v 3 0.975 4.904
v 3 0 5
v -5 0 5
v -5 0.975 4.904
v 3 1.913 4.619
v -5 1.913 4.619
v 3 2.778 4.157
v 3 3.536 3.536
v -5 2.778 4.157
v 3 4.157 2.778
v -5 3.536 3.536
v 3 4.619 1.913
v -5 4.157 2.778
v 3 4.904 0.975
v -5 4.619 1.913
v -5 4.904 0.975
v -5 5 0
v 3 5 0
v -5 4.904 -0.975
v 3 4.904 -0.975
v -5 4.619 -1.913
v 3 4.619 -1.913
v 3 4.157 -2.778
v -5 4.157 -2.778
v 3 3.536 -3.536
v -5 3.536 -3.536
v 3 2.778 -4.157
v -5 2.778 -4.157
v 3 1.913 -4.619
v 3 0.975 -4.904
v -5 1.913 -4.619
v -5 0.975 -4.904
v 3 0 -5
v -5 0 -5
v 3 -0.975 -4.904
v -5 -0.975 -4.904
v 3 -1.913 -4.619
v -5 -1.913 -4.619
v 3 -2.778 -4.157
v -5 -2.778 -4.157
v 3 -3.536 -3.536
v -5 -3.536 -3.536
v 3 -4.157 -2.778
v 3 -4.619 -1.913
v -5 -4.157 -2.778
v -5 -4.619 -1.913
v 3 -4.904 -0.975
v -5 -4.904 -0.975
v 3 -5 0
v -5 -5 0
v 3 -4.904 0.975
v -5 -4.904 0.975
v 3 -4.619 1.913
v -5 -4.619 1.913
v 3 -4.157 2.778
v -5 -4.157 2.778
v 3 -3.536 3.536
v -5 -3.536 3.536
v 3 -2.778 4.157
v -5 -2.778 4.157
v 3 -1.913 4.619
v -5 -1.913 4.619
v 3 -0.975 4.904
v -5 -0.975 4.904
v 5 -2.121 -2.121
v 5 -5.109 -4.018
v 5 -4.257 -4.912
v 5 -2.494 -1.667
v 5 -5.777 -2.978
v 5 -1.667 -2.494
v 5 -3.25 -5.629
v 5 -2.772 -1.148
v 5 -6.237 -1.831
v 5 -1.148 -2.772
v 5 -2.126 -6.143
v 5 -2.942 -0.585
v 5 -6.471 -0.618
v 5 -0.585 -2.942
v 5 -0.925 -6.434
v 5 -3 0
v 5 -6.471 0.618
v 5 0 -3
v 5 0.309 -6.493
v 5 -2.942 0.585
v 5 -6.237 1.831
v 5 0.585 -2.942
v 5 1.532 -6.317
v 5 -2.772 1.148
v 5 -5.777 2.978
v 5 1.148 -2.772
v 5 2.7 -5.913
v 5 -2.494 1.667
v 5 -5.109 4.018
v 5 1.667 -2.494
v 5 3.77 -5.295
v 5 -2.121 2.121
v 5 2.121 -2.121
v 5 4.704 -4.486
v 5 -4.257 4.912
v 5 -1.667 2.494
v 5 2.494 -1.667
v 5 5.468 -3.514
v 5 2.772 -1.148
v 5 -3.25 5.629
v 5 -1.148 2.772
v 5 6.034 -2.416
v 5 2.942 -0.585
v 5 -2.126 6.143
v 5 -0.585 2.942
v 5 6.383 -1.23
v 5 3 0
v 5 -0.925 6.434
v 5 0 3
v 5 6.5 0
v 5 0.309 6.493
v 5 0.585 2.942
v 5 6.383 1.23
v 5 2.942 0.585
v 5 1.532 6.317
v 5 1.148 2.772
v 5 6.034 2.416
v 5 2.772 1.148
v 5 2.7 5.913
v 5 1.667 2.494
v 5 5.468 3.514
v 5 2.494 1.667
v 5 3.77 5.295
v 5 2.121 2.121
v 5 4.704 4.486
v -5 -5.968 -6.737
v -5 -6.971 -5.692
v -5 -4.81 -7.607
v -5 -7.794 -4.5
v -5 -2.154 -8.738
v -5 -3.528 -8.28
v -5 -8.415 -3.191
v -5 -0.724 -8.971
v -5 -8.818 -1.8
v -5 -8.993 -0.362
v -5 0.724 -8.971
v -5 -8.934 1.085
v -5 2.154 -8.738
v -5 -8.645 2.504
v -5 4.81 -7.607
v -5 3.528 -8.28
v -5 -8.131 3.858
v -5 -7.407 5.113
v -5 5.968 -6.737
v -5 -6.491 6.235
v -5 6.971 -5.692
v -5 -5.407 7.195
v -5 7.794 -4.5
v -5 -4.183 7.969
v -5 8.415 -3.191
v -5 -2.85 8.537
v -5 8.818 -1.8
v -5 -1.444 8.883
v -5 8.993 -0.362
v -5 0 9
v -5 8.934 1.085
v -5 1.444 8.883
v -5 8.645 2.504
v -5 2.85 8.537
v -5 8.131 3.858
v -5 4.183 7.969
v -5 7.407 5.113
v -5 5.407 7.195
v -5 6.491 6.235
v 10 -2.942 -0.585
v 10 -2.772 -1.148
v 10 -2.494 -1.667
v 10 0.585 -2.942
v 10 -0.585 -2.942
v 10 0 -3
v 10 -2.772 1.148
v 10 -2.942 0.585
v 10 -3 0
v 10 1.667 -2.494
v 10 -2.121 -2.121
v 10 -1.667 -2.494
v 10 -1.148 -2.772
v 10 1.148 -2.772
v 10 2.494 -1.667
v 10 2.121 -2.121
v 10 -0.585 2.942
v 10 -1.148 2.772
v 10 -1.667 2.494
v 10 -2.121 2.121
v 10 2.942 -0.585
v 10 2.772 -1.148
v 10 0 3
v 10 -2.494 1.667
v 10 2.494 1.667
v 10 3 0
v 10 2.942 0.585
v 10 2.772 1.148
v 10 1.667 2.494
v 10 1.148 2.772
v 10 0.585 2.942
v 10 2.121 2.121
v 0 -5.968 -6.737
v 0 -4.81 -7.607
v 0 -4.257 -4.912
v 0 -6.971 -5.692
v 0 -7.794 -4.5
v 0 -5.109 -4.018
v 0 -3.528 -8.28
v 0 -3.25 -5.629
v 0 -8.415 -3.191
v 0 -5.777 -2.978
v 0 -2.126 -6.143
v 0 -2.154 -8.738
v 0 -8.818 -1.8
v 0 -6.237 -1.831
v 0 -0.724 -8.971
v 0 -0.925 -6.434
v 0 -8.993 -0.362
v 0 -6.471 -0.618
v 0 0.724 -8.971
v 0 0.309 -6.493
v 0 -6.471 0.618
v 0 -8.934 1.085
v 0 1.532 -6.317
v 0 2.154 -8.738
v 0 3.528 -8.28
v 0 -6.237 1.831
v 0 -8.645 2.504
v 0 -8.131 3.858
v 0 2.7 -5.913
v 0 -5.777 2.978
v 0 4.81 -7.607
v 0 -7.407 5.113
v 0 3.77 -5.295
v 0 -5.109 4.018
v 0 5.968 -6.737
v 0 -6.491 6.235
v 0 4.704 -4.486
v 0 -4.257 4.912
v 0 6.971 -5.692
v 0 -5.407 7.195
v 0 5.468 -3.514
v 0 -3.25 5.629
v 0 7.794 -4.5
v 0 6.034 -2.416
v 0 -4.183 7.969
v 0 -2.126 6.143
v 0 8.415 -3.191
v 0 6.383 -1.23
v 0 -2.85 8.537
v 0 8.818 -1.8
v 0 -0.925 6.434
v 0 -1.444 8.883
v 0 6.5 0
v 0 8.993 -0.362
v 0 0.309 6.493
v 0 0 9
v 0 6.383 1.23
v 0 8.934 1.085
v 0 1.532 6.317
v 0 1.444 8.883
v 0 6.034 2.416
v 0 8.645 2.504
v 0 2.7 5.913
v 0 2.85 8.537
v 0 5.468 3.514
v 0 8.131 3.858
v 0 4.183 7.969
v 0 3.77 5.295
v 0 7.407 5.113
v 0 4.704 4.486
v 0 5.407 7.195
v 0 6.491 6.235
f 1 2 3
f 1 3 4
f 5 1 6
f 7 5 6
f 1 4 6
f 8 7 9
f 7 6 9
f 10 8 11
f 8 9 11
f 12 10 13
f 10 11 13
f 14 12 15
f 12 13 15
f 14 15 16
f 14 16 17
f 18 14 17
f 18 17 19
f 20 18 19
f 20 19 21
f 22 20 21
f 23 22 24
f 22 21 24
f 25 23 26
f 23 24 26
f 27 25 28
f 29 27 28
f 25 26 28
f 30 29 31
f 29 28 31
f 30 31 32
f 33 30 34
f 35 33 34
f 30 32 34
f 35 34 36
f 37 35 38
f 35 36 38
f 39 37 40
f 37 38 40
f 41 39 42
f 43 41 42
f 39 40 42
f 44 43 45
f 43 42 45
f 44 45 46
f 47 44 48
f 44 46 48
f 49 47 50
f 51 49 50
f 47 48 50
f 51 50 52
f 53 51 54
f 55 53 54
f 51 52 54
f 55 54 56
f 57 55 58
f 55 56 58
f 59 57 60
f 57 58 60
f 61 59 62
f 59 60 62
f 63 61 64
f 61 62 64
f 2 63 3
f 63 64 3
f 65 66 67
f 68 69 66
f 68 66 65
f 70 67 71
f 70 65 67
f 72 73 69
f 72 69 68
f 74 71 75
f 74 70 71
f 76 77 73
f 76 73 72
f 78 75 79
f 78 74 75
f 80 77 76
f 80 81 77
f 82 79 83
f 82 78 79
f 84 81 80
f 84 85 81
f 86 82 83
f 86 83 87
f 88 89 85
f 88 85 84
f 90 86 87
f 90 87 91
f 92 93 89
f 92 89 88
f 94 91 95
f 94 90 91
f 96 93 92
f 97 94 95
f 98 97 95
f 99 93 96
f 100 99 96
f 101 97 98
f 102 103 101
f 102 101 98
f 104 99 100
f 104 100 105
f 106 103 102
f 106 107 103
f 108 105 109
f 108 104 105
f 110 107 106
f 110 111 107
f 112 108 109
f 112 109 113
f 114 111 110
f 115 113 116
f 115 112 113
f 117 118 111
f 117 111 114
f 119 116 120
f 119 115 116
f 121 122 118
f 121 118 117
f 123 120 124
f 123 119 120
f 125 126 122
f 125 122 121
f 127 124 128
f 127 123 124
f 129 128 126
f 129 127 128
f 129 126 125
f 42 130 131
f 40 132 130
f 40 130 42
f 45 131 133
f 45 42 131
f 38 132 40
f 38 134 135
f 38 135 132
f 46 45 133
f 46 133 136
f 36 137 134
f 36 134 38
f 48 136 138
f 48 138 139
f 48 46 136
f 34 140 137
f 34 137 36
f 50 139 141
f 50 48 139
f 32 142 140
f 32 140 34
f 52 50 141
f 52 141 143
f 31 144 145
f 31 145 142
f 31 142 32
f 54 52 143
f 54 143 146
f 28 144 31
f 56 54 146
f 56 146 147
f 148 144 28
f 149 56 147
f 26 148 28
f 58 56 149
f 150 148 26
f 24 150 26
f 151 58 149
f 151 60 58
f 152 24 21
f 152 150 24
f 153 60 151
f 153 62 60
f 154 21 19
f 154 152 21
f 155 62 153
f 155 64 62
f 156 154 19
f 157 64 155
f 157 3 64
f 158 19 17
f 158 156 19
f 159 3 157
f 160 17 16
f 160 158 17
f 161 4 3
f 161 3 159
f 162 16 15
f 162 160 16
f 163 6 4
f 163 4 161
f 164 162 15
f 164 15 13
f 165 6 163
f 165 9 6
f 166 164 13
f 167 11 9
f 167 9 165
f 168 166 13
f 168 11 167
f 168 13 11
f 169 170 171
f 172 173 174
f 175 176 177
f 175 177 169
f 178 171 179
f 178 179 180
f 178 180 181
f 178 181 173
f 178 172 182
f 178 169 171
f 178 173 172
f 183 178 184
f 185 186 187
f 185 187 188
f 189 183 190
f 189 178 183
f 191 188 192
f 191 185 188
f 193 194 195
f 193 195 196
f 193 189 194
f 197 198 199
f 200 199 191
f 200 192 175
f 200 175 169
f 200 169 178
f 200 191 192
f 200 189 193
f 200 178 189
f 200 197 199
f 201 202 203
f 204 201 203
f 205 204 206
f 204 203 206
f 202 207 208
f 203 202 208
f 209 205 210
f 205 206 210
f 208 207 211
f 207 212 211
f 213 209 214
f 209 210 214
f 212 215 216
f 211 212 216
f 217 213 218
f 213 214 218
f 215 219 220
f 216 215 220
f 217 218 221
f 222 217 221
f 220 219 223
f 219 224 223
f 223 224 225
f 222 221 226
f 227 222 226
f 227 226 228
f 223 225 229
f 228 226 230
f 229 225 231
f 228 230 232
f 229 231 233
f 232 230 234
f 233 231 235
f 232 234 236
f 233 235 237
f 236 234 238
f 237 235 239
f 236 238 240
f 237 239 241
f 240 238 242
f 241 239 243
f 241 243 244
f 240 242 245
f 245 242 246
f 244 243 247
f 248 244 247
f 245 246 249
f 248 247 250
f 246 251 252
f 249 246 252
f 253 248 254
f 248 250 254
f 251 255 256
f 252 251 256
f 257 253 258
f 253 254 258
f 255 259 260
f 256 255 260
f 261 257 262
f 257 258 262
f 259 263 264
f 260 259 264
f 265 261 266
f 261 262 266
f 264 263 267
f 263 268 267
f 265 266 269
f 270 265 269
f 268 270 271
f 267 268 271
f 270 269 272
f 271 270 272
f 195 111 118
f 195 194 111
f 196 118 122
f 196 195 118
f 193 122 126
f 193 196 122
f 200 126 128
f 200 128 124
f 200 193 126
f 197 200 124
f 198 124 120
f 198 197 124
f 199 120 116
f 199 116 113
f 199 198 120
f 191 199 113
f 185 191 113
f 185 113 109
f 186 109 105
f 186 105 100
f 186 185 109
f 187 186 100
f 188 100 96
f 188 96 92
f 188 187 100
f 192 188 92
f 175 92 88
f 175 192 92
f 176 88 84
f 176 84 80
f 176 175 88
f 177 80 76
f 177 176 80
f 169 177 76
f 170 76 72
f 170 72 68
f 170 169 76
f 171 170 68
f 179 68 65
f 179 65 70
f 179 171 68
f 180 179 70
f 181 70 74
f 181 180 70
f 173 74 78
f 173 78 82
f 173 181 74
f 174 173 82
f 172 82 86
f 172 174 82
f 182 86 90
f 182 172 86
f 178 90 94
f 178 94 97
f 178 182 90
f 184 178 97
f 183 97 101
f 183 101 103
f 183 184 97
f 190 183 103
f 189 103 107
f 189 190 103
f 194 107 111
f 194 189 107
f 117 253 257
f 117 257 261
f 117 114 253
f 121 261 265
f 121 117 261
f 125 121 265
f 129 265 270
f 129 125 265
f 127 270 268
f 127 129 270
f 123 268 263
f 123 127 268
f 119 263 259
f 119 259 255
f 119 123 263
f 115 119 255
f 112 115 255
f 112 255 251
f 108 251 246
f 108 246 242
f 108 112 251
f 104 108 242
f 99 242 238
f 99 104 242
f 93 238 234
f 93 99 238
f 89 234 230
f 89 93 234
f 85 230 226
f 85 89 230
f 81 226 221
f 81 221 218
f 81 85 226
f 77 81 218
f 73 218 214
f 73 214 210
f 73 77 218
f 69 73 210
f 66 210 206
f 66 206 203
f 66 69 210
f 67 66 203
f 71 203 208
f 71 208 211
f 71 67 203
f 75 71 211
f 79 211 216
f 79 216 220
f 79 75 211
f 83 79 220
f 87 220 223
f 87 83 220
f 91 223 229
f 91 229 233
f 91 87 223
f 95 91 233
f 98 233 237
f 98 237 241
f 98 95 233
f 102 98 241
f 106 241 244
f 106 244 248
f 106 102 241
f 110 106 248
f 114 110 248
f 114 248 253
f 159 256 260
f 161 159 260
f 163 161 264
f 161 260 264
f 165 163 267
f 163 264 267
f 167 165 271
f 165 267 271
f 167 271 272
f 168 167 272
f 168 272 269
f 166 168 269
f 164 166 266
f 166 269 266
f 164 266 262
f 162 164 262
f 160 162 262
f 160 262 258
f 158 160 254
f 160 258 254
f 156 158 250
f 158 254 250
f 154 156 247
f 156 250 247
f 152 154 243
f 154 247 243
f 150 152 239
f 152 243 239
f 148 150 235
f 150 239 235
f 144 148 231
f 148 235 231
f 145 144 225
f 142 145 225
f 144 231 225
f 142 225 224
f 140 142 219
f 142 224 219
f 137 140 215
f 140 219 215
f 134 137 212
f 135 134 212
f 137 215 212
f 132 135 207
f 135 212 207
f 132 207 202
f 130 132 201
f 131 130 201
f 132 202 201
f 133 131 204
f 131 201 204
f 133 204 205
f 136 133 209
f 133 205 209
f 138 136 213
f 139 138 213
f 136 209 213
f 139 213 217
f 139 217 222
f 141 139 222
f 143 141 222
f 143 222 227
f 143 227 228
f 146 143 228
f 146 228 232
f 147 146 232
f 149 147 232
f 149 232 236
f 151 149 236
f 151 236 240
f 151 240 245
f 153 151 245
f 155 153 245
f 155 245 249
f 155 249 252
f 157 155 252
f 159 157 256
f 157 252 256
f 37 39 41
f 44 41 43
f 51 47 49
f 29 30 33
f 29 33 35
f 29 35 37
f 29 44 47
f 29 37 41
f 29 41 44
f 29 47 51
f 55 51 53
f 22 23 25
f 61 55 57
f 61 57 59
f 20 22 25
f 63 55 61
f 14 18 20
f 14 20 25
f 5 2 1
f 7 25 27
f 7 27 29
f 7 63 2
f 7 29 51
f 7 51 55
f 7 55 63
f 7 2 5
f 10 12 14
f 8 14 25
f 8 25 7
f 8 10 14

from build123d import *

# Parameters (mm, degrees)
SKETCH_3_R          = 9
EXTRUDE_1_DEPTH     = 5
SKETCH_4_R          = 5
CUT_EXTRUDE_1_DEPTH = 8


with BuildPart() as part:
    # 草图2 → 旋转1 (revolve)
    with BuildSketch(Plane.XY):
        Polygon((0, 0), (0, 6.5), (5, 6.5), (5, 3), (10, 3), (10, 0), align=None)
    revolve(axis=Axis((0, 0, 0), (1, 0, 0)))

    # 草图3 → 凸台-拉伸1 (add)
    with BuildSketch(Plane.ZY):
        Circle(SKETCH_3_R)
    extrude(amount=EXTRUDE_1_DEPTH)

    # 草图4 → 切除-拉伸1 (cut)
    with BuildSketch(Plane.ZY.offset(5)):
        Circle(SKETCH_4_R)
    extrude(amount=-CUT_EXTRUDE_1_DEPTH, mode=Mode.SUBTRACT)


solid = part.part
